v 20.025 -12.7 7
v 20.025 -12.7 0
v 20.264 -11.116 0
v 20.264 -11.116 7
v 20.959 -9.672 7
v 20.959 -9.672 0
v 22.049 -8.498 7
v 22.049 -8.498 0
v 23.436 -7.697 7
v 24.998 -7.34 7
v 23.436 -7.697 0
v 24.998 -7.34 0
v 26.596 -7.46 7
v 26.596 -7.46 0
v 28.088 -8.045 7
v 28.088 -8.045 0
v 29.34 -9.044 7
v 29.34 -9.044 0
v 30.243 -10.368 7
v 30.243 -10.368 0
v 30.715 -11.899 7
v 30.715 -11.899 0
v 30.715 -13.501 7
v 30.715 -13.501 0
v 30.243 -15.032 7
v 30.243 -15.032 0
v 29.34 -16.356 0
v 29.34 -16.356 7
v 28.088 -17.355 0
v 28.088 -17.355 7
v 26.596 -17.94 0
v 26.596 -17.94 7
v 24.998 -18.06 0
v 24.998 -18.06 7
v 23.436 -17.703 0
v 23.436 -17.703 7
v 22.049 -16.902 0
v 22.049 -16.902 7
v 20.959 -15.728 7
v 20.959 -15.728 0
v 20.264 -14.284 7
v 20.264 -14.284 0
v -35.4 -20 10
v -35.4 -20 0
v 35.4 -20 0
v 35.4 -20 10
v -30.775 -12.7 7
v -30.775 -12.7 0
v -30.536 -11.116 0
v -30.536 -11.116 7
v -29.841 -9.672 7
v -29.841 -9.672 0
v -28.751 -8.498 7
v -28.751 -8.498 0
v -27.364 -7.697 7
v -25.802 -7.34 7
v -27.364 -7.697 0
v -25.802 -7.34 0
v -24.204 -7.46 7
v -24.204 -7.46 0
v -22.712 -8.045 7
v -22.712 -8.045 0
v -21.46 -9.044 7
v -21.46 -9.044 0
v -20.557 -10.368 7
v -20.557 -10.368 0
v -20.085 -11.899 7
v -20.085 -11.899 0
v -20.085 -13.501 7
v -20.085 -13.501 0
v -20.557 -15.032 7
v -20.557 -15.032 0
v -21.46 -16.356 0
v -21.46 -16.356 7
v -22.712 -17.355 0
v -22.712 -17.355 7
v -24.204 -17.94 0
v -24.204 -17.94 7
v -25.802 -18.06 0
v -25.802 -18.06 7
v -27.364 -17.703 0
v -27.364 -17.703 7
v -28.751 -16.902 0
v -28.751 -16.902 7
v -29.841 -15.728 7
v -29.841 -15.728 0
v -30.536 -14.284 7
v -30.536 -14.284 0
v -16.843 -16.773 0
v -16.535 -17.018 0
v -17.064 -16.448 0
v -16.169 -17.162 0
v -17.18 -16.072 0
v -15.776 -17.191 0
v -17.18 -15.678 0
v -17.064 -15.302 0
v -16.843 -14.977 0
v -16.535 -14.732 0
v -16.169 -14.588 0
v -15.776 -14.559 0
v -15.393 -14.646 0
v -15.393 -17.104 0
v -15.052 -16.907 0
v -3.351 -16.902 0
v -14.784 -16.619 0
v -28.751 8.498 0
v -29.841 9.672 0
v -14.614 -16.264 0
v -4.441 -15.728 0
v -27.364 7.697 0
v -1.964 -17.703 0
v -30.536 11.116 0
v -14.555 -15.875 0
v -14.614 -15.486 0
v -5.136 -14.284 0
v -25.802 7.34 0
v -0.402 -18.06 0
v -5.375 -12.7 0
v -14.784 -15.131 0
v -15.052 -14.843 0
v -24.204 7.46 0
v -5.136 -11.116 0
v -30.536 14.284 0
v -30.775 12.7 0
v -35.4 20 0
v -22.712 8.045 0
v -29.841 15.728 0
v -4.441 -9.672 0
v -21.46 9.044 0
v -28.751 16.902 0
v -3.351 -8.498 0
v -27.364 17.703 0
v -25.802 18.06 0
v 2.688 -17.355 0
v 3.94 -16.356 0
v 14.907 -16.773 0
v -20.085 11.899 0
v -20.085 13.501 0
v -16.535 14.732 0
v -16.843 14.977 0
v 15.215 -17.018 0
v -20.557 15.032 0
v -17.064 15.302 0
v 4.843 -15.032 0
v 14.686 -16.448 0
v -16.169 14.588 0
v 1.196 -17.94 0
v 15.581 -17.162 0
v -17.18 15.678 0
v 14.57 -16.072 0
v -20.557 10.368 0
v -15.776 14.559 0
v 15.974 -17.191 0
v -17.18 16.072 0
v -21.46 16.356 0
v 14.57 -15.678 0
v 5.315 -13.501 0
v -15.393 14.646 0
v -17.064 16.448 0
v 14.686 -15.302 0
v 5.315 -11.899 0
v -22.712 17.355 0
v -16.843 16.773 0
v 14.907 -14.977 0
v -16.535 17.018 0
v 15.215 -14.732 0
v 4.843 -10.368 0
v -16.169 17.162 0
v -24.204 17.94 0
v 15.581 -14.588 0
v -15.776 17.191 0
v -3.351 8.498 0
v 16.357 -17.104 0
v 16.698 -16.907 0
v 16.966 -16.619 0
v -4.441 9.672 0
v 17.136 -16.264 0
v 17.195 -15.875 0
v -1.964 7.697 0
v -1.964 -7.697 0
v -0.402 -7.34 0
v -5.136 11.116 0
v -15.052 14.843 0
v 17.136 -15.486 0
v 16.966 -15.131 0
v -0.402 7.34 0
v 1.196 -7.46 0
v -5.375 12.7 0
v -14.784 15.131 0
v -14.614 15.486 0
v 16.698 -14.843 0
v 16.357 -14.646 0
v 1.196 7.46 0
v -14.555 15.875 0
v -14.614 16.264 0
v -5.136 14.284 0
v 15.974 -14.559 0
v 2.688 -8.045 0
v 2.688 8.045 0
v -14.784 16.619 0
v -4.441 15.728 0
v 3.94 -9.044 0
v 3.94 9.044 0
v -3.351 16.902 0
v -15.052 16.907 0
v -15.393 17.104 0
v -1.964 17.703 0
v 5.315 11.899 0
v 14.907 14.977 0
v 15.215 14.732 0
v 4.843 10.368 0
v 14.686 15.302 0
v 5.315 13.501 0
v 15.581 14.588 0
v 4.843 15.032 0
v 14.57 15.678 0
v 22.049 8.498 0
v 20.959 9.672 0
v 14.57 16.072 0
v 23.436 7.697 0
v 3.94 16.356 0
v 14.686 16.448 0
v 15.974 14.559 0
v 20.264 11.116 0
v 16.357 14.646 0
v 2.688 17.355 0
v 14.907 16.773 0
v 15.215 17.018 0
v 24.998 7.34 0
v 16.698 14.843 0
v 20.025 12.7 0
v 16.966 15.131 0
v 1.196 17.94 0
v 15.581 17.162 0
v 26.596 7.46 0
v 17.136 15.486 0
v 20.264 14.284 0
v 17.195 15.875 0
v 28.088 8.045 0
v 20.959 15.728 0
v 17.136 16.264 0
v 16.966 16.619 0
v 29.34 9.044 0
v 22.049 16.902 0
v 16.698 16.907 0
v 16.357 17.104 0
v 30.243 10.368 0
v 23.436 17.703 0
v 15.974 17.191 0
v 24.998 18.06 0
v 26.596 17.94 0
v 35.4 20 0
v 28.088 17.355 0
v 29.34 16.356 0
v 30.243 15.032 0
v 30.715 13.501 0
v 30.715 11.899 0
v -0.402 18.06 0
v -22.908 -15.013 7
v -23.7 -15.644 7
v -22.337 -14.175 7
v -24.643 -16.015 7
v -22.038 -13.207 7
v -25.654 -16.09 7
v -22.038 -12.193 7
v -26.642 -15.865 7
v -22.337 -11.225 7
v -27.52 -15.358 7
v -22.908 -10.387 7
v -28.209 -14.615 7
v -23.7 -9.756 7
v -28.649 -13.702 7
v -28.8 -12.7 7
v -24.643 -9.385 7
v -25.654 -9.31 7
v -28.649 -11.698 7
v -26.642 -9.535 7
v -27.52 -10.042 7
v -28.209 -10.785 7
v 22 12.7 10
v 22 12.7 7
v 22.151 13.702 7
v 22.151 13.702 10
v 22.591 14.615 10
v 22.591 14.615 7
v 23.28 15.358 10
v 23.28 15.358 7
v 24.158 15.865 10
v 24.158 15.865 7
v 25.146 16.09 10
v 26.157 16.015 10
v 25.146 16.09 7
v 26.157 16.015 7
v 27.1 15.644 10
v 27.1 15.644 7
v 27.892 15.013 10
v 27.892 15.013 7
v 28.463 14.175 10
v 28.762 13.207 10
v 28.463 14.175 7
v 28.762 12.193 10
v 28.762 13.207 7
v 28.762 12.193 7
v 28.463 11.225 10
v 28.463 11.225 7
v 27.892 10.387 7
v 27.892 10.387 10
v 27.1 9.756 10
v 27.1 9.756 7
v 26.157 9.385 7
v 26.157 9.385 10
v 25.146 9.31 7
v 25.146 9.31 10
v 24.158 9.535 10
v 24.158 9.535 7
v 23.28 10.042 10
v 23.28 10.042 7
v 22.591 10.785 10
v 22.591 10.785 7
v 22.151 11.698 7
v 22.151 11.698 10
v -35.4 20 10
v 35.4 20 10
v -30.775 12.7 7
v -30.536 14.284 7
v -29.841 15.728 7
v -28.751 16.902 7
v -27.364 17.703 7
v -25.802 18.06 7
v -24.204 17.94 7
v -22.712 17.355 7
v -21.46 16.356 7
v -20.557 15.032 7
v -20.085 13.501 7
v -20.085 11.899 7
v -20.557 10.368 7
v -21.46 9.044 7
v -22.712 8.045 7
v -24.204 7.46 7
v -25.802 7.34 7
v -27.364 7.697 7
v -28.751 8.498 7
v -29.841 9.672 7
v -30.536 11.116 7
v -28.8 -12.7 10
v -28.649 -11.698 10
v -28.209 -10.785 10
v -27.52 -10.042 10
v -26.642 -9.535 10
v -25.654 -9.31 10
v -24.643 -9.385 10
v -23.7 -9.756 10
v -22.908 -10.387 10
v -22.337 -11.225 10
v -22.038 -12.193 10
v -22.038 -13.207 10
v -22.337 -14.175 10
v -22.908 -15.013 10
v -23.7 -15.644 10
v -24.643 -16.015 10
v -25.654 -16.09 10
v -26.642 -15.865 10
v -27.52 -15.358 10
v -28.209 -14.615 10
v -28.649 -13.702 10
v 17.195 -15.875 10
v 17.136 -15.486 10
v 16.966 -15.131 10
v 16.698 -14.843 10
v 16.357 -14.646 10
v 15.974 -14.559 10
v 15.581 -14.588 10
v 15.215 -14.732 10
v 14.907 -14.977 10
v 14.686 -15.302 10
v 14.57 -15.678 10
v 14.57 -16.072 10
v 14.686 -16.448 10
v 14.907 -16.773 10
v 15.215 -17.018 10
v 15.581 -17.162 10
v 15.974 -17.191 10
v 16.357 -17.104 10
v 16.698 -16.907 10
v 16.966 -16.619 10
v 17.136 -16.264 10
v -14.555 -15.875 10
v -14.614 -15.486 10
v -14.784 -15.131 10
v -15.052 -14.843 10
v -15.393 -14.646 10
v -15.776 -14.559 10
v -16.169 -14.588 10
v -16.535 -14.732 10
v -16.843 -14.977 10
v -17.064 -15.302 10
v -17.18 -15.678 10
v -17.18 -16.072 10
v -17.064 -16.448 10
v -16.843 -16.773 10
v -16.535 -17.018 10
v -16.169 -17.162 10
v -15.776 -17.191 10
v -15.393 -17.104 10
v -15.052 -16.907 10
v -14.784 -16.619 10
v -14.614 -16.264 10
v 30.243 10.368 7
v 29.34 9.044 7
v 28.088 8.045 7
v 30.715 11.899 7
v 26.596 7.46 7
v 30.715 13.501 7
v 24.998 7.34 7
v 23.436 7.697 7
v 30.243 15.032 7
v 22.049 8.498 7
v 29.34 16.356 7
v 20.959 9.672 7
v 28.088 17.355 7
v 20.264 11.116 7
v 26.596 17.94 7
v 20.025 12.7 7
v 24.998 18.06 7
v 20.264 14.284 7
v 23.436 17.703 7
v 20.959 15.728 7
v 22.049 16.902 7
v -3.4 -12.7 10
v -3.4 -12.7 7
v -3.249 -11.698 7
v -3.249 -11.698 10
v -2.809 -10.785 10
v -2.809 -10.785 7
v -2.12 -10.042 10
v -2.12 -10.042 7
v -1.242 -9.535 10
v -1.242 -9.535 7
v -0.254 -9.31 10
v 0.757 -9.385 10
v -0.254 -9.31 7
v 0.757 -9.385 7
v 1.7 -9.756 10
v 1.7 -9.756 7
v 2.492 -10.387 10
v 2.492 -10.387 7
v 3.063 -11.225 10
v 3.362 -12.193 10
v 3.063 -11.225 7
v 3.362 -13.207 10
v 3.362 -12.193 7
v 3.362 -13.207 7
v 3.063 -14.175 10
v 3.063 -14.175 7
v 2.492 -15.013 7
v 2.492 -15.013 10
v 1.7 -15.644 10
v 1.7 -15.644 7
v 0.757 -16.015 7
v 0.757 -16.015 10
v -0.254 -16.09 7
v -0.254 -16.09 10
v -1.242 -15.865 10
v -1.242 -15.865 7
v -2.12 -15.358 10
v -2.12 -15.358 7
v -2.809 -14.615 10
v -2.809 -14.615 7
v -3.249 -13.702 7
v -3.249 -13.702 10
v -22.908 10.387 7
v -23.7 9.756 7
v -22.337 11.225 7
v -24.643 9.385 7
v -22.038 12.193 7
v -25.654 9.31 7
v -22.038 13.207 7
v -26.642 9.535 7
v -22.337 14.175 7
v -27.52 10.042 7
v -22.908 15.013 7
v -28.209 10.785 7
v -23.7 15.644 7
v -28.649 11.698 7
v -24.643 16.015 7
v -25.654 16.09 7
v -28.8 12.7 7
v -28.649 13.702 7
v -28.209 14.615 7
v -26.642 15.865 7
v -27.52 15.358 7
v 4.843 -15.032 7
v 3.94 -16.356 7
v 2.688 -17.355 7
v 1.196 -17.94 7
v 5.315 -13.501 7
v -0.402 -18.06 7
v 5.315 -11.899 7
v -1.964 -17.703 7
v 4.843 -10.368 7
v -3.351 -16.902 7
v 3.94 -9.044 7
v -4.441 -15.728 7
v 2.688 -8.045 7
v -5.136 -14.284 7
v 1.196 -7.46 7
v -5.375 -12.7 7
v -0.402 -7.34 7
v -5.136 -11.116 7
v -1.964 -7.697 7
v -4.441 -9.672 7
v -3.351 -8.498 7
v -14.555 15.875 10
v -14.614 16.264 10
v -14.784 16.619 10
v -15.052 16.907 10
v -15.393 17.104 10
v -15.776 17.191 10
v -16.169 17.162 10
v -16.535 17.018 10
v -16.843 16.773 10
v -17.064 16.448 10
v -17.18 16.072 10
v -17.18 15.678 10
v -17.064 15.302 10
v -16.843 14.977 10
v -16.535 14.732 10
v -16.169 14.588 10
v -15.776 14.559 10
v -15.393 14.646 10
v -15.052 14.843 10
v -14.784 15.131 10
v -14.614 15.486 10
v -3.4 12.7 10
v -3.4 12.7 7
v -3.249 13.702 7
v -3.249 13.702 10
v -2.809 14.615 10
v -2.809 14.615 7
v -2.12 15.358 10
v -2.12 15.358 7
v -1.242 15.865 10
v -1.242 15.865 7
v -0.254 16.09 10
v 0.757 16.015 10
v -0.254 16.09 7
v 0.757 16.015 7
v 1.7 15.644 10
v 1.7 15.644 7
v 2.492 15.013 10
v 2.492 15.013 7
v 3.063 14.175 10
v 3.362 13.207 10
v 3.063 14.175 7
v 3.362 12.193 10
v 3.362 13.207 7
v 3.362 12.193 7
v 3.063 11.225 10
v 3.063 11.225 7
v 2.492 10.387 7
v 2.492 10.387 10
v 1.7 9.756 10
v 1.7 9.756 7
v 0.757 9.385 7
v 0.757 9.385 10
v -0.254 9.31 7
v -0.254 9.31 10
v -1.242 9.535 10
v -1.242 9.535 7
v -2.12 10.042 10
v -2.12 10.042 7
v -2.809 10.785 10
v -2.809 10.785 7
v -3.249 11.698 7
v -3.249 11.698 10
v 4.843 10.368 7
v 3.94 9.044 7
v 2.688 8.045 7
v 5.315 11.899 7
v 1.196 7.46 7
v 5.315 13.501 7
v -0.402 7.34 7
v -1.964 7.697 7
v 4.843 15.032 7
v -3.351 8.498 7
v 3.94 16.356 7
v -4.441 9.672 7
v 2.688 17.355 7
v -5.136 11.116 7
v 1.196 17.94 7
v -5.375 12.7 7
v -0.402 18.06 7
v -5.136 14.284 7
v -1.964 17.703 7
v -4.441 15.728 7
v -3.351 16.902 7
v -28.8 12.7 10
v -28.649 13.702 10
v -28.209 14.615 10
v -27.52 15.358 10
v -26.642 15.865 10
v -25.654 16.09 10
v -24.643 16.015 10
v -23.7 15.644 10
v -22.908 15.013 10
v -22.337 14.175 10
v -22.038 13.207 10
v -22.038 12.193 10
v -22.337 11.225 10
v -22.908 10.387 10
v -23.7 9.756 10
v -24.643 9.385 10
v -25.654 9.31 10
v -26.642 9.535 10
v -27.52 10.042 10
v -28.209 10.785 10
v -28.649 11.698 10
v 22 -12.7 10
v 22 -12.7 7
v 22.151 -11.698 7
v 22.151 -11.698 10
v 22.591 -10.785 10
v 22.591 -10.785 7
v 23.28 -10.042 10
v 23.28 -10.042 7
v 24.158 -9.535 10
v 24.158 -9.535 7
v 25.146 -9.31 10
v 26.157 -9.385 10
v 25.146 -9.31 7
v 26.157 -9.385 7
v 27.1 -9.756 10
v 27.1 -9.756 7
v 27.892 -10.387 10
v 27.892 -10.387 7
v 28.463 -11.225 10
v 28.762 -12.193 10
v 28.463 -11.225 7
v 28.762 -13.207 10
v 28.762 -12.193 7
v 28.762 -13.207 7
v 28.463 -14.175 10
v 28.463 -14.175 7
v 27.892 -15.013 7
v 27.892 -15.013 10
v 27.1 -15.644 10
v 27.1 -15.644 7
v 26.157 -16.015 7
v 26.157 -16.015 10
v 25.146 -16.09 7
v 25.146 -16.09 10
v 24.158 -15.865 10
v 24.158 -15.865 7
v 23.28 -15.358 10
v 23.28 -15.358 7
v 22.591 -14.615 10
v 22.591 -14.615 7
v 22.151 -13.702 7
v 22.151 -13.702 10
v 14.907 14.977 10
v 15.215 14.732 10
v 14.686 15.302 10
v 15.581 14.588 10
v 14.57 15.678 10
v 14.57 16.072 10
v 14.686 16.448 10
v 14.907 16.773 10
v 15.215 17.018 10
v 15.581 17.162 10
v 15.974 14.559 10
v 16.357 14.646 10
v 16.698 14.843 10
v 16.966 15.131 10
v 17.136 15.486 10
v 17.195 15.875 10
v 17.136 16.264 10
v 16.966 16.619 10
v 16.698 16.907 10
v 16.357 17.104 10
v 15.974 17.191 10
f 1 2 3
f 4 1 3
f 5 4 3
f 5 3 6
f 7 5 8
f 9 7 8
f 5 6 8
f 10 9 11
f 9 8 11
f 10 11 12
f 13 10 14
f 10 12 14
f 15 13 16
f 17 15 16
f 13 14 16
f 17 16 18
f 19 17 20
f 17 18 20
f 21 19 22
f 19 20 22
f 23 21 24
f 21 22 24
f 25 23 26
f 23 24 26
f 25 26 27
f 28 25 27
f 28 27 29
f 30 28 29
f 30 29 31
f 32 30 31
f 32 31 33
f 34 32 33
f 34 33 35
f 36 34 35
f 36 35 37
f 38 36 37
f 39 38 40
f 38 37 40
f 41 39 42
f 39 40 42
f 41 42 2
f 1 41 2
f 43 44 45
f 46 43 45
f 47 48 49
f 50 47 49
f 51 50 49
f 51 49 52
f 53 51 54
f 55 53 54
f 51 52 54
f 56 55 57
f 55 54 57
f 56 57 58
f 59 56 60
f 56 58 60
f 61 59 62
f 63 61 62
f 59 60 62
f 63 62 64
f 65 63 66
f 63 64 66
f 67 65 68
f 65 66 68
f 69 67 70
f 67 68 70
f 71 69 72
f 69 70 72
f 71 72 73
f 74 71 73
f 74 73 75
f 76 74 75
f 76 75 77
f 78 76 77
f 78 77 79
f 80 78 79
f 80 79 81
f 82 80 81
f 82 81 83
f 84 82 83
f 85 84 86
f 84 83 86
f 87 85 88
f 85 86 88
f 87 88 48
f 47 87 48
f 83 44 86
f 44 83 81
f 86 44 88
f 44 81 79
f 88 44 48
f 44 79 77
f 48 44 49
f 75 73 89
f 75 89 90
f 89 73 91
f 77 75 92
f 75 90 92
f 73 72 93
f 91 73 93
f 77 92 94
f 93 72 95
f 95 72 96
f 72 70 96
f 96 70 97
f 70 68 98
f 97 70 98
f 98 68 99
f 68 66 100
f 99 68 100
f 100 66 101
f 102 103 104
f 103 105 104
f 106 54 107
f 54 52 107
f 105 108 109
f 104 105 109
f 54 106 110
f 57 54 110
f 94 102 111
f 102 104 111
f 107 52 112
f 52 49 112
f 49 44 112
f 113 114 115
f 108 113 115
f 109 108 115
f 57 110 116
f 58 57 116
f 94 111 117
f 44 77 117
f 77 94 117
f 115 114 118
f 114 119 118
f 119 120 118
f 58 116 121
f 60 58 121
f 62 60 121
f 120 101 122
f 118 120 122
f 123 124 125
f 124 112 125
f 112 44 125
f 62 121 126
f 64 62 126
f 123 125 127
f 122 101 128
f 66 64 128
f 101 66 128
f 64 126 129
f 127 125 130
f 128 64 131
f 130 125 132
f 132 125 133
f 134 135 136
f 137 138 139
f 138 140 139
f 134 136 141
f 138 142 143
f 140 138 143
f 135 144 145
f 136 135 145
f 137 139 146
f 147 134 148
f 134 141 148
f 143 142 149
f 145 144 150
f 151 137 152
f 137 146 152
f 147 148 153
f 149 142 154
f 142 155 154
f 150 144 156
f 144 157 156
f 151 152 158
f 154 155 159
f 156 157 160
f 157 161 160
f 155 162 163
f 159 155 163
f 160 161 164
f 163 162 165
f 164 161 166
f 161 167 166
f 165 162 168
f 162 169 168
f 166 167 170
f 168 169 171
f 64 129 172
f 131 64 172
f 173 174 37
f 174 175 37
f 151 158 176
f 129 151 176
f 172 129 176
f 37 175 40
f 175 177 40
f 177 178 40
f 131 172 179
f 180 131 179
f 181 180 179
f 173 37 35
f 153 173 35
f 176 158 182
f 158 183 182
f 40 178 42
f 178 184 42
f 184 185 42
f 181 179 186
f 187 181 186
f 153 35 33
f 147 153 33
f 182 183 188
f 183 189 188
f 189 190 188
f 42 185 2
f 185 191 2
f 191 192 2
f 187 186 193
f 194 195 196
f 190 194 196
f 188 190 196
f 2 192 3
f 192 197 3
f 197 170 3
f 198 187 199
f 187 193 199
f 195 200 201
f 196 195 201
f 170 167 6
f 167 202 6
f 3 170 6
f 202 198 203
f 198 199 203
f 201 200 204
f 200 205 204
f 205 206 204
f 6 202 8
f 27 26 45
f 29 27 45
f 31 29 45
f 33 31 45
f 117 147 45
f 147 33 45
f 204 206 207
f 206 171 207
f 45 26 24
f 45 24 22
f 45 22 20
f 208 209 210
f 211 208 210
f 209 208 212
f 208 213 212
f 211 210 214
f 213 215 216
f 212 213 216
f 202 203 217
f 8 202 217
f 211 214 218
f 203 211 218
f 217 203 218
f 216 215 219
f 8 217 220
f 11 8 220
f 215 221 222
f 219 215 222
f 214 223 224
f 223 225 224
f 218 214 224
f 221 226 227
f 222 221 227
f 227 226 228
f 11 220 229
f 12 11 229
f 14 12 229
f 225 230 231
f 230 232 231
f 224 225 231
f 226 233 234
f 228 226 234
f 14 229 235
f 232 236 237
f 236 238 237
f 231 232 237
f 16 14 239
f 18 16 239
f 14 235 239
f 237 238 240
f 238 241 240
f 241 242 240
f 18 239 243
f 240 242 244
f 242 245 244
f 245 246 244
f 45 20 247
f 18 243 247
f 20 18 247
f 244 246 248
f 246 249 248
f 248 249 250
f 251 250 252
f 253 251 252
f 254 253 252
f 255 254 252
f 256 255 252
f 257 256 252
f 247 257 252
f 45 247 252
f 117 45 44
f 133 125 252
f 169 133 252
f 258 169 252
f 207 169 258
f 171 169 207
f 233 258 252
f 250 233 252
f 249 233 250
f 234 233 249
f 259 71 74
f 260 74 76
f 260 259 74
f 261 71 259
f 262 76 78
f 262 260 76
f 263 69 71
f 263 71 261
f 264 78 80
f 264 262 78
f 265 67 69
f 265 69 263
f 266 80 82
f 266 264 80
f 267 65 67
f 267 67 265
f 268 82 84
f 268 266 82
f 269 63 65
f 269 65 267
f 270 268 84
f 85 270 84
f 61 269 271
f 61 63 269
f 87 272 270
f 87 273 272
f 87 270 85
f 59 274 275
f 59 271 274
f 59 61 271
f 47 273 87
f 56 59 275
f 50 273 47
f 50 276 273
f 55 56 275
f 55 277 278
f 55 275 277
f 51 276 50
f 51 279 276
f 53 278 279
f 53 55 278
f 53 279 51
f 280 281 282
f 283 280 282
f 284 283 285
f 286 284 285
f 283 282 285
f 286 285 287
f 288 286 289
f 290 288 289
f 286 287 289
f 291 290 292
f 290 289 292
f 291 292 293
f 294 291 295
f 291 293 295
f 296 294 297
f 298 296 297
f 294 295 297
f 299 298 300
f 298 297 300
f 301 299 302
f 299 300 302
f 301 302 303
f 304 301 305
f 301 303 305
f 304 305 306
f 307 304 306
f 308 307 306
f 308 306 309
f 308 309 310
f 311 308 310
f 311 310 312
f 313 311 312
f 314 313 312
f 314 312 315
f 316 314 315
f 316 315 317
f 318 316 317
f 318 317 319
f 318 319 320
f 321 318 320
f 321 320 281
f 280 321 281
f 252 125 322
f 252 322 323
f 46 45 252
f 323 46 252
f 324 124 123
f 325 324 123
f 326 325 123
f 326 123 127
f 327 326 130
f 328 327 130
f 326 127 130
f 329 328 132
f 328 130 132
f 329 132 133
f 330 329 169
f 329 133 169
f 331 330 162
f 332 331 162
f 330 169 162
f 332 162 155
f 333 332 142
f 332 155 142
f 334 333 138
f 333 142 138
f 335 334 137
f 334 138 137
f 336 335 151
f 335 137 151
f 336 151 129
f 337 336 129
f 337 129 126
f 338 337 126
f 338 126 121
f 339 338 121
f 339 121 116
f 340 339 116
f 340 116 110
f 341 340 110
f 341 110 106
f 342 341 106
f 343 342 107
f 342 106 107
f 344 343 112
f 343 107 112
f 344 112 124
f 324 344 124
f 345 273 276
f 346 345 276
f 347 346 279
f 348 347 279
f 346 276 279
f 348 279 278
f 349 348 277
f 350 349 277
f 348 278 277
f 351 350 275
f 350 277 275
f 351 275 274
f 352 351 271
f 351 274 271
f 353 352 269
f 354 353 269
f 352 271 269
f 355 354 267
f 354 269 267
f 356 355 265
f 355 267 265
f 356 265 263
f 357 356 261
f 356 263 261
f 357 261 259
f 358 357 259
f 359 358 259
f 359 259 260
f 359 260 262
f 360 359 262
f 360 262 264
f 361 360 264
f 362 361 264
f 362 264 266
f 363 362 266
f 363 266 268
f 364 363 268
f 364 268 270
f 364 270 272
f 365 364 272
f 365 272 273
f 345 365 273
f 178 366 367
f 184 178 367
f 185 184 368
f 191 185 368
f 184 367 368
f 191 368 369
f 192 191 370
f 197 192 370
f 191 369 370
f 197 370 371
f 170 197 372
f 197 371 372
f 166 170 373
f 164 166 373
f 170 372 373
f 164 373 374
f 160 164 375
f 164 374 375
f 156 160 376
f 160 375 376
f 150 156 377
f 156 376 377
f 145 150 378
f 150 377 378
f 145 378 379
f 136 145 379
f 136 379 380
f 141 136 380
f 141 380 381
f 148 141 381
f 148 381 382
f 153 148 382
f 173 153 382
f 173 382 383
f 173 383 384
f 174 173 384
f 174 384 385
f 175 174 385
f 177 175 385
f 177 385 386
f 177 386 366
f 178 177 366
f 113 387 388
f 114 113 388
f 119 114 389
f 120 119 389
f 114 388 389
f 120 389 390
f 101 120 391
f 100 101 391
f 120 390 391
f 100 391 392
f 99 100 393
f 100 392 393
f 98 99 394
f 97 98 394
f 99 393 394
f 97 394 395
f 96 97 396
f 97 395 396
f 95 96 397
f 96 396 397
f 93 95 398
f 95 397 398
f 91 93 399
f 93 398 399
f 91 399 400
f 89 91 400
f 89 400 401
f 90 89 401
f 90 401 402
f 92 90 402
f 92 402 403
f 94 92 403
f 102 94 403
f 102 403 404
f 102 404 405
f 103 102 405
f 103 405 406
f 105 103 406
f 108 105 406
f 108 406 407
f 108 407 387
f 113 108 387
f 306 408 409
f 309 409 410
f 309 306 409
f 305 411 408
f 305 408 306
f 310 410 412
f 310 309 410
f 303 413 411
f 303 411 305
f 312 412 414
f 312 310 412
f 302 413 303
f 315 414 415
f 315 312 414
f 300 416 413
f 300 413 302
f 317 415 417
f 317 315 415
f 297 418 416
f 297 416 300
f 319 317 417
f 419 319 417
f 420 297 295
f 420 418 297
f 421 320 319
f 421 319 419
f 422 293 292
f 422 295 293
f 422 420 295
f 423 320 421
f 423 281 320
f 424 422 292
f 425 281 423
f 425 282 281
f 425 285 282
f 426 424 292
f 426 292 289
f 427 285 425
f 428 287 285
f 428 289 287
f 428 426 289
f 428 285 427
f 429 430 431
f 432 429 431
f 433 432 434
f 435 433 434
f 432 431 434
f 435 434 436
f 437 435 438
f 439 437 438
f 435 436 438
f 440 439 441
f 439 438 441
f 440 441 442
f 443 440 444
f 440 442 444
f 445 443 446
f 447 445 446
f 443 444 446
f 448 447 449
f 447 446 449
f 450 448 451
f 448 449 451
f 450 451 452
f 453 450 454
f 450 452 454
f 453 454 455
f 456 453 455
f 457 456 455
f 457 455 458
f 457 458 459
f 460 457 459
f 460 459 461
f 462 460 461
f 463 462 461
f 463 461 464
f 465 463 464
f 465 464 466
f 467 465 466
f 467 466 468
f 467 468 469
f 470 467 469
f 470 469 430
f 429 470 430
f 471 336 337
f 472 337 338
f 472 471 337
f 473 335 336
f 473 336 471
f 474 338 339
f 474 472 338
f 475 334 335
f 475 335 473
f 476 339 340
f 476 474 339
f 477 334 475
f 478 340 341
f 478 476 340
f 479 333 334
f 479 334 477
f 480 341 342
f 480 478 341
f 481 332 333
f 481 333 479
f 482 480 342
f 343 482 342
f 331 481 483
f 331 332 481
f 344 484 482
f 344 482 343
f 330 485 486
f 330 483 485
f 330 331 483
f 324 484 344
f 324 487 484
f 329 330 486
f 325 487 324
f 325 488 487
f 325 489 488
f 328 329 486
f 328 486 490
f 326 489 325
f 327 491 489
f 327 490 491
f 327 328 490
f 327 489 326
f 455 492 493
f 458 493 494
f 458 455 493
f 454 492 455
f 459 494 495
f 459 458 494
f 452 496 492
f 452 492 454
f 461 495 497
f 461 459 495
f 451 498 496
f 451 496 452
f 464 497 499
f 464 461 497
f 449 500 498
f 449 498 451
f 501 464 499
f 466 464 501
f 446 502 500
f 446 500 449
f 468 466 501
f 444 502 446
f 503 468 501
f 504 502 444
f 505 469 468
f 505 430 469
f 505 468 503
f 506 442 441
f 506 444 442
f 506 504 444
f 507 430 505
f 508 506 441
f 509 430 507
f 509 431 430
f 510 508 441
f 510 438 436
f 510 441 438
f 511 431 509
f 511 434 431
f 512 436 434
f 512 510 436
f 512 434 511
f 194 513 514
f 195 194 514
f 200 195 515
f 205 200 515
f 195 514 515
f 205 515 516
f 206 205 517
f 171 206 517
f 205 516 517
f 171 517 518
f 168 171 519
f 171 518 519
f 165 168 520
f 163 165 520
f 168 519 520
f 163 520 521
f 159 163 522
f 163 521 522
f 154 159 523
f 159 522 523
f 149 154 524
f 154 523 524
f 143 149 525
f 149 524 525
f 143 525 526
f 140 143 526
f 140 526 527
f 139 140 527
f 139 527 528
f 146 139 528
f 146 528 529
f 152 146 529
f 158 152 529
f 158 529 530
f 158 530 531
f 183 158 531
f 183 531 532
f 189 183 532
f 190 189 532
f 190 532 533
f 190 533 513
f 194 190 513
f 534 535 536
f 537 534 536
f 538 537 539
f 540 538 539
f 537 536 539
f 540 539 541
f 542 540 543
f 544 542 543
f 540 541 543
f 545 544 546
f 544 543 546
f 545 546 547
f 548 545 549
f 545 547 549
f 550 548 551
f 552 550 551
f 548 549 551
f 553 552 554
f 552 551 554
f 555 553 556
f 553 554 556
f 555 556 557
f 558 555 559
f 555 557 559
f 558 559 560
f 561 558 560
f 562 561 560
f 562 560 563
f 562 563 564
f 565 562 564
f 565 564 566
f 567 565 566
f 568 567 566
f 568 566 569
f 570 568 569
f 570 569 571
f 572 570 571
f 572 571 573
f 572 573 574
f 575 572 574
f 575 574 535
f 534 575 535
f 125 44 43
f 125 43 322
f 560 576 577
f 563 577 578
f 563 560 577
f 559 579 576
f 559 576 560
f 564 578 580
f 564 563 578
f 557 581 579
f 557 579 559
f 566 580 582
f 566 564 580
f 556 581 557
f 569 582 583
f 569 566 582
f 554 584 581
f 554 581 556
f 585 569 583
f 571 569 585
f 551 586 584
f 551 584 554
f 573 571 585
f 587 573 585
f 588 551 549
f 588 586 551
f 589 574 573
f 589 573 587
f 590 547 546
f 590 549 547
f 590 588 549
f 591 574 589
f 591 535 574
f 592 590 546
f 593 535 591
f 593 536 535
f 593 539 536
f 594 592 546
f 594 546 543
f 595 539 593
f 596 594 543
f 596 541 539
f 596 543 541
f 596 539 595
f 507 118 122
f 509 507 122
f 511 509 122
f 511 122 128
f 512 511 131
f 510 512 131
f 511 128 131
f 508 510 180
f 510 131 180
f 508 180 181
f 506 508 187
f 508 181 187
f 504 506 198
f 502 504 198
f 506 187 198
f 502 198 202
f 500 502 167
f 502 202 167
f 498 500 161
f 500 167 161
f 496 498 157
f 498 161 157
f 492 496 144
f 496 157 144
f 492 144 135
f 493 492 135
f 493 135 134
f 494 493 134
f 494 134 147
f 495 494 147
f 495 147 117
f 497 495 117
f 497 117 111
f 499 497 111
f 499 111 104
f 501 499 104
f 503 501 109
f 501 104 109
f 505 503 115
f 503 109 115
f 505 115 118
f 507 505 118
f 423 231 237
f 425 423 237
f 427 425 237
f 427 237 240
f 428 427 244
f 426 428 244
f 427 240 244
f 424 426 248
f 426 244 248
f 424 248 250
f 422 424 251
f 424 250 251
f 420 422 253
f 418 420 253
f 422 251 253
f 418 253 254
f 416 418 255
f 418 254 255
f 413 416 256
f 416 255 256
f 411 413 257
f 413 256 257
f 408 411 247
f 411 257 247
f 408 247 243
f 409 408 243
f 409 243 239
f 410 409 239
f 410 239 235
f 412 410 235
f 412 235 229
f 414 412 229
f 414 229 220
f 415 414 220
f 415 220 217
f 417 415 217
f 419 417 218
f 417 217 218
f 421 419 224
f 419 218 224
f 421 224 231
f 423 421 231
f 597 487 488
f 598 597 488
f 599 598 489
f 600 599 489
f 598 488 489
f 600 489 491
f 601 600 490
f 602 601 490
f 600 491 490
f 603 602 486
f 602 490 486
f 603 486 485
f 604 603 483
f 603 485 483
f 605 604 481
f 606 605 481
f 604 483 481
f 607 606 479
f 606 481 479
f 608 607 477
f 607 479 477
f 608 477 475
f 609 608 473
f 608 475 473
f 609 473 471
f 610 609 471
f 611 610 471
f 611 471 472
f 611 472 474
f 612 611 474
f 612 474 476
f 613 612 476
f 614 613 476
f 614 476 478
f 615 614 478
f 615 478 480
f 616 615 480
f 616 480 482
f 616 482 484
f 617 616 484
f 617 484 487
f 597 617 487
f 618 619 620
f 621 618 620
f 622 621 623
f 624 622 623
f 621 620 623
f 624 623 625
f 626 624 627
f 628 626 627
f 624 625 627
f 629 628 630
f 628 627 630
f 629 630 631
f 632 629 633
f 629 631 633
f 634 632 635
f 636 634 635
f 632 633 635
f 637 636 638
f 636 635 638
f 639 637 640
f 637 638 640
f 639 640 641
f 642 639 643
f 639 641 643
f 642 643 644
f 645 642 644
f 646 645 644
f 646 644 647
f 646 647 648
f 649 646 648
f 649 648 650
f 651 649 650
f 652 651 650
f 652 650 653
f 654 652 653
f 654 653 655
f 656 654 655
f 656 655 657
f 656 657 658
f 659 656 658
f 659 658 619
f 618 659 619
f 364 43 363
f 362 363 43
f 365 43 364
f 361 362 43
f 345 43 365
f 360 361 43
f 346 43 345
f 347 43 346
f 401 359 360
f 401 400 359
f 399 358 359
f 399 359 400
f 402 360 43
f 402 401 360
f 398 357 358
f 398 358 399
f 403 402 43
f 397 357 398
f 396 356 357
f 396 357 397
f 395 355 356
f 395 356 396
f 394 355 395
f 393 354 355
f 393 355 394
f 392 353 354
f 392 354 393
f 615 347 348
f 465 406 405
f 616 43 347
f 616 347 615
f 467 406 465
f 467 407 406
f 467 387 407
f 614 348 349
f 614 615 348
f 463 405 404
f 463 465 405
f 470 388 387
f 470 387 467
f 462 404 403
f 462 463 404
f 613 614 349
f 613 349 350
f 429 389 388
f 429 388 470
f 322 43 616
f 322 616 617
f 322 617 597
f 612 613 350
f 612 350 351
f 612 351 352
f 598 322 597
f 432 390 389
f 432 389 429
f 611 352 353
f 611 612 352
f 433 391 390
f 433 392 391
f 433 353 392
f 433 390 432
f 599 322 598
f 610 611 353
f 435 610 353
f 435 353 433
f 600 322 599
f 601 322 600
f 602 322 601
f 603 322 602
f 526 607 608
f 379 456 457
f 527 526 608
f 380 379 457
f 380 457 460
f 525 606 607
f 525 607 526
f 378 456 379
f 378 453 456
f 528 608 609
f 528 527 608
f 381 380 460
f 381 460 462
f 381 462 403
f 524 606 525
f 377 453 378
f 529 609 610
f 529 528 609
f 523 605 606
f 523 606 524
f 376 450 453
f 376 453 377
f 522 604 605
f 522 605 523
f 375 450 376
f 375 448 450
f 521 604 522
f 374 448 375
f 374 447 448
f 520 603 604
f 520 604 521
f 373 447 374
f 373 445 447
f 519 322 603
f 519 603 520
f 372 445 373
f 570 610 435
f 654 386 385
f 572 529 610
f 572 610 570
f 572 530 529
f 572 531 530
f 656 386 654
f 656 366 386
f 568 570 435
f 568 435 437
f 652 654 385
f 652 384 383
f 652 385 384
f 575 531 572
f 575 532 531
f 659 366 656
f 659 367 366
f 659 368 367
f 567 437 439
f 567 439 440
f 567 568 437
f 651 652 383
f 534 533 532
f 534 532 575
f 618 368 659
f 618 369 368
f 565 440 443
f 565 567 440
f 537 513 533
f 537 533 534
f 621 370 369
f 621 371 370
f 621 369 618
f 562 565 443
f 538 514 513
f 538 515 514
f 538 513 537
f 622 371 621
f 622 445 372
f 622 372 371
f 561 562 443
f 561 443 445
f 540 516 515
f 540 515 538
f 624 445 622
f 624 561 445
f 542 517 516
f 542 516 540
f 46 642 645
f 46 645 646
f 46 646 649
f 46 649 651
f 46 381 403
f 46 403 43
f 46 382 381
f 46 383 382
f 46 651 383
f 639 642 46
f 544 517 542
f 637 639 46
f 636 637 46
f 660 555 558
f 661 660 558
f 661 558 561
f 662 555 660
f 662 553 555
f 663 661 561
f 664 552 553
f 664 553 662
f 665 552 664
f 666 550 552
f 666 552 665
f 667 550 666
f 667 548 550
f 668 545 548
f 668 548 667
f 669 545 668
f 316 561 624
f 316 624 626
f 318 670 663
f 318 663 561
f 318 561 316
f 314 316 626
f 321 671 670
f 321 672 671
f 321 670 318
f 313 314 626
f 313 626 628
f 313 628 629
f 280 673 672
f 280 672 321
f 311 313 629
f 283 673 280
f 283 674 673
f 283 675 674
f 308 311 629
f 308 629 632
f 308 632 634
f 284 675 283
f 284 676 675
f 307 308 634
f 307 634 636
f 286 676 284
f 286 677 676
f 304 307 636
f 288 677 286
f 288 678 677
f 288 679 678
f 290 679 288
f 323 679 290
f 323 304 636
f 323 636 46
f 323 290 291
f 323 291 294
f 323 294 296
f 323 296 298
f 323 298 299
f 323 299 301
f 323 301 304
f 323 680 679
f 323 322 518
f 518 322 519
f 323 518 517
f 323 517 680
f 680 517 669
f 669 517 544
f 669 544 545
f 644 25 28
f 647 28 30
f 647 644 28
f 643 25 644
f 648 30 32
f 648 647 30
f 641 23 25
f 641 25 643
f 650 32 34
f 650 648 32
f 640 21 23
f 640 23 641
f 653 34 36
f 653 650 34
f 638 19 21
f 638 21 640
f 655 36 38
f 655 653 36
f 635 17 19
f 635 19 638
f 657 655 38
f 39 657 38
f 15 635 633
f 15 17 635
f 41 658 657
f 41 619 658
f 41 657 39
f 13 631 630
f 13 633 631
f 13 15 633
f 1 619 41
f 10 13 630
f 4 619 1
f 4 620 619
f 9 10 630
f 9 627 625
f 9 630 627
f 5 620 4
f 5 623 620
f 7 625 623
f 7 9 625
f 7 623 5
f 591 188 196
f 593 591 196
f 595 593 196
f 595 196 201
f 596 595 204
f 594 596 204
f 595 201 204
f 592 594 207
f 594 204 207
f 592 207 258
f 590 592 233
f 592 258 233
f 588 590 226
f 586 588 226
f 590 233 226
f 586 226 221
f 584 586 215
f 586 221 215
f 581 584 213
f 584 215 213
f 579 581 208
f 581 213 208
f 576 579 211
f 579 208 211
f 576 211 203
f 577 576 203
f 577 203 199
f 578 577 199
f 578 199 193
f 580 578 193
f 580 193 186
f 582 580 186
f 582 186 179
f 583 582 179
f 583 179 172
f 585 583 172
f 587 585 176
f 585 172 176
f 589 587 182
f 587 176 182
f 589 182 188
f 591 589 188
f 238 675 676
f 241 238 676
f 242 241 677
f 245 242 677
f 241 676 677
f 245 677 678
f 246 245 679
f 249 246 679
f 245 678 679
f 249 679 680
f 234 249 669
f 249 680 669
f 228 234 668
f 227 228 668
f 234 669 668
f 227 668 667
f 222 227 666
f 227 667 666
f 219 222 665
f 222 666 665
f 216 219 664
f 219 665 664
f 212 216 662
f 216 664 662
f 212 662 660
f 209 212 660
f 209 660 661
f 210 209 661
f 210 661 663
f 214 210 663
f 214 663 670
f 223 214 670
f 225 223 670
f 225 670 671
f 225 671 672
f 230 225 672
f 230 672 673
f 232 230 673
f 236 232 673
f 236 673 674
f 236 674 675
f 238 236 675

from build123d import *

# Parameters (mm, degrees)
SKETCH1_W           = 70.8
SKETCH1_H           = 40
BOSS_EXTRUDE1_DEPTH = 10
SKETCH2_R           = 1.32
CUT_EXTRUDE1_DEPTH  = 11
SKETCH3_R           = 3.4
CUT_EXTRUDE2_DEPTH  = 11
SKETCH4_R           = 5.375
CUT_EXTRUDE3_DEPTH  = 7


with BuildPart() as part:
    # Sketch1 → Boss-Extrude1 (new body)
    with BuildSketch(Plane.XY):
        Rectangle(SKETCH1_W, SKETCH1_H)
    extrude(amount=BOSS_EXTRUDE1_DEPTH)

    # Sketch2 → Cut-Extrude1 (cut, through all)
    with BuildSketch(Plane.XY.offset(10)):
        with Locations((15.875, -15.875)):
            Circle(SKETCH2_R)
        with Locations((-15.875, -15.875)):
            Circle(SKETCH2_R)
        with Locations((-15.875, 15.875)):
            Circle(SKETCH2_R)
        with Locations((15.875, 15.875)):
            Circle(SKETCH2_R)
    extrude(amount=-CUT_EXTRUDE1_DEPTH, mode=Mode.SUBTRACT)

    # Sketch3 → Cut-Extrude2 (cut, through all)
    with BuildSketch(Plane(origin=(0, 0, 0), x_dir=(-1, 0, 0), z_dir=(0, 0, -1))):
        with Locations((-25.4, -12.7)):
            Circle(SKETCH3_R)
        with Locations((0, -12.7)):
            Circle(SKETCH3_R)
        with Locations((25.4, -12.7)):
            Circle(SKETCH3_R)
        with Locations((0, 12.7)):
            Circle(SKETCH3_R)
        with Locations((25.4, 12.7)):
            Circle(SKETCH3_R)
        with Locations((-25.4, 12.7)):
            Circle(SKETCH3_R)
    extrude(amount=-CUT_EXTRUDE2_DEPTH, mode=Mode.SUBTRACT)

    # Sketch4 → Cut-Extrude3 (cut)
    with BuildSketch(Plane(origin=(0, 0, 0), x_dir=(-1, 0, 0), z_dir=(0, 0, -1))):
        with Locations((25.4, -12.7)):
            Circle(SKETCH4_R)
        with Locations((0, -12.7)):
            Circle(SKETCH4_R)
        with Locations((-25.4, -12.7)):
            Circle(SKETCH4_R)
        with Locations((0, 12.7)):
            Circle(SKETCH4_R)
        with Locations((-25.4, 12.7)):
            Circle(SKETCH4_R)
        with Locations((25.4, 12.7)):
            Circle(SKETCH4_R)
    extrude(amount=-CUT_EXTRUDE3_DEPTH, mode=Mode.SUBTRACT)


solid = part.part
